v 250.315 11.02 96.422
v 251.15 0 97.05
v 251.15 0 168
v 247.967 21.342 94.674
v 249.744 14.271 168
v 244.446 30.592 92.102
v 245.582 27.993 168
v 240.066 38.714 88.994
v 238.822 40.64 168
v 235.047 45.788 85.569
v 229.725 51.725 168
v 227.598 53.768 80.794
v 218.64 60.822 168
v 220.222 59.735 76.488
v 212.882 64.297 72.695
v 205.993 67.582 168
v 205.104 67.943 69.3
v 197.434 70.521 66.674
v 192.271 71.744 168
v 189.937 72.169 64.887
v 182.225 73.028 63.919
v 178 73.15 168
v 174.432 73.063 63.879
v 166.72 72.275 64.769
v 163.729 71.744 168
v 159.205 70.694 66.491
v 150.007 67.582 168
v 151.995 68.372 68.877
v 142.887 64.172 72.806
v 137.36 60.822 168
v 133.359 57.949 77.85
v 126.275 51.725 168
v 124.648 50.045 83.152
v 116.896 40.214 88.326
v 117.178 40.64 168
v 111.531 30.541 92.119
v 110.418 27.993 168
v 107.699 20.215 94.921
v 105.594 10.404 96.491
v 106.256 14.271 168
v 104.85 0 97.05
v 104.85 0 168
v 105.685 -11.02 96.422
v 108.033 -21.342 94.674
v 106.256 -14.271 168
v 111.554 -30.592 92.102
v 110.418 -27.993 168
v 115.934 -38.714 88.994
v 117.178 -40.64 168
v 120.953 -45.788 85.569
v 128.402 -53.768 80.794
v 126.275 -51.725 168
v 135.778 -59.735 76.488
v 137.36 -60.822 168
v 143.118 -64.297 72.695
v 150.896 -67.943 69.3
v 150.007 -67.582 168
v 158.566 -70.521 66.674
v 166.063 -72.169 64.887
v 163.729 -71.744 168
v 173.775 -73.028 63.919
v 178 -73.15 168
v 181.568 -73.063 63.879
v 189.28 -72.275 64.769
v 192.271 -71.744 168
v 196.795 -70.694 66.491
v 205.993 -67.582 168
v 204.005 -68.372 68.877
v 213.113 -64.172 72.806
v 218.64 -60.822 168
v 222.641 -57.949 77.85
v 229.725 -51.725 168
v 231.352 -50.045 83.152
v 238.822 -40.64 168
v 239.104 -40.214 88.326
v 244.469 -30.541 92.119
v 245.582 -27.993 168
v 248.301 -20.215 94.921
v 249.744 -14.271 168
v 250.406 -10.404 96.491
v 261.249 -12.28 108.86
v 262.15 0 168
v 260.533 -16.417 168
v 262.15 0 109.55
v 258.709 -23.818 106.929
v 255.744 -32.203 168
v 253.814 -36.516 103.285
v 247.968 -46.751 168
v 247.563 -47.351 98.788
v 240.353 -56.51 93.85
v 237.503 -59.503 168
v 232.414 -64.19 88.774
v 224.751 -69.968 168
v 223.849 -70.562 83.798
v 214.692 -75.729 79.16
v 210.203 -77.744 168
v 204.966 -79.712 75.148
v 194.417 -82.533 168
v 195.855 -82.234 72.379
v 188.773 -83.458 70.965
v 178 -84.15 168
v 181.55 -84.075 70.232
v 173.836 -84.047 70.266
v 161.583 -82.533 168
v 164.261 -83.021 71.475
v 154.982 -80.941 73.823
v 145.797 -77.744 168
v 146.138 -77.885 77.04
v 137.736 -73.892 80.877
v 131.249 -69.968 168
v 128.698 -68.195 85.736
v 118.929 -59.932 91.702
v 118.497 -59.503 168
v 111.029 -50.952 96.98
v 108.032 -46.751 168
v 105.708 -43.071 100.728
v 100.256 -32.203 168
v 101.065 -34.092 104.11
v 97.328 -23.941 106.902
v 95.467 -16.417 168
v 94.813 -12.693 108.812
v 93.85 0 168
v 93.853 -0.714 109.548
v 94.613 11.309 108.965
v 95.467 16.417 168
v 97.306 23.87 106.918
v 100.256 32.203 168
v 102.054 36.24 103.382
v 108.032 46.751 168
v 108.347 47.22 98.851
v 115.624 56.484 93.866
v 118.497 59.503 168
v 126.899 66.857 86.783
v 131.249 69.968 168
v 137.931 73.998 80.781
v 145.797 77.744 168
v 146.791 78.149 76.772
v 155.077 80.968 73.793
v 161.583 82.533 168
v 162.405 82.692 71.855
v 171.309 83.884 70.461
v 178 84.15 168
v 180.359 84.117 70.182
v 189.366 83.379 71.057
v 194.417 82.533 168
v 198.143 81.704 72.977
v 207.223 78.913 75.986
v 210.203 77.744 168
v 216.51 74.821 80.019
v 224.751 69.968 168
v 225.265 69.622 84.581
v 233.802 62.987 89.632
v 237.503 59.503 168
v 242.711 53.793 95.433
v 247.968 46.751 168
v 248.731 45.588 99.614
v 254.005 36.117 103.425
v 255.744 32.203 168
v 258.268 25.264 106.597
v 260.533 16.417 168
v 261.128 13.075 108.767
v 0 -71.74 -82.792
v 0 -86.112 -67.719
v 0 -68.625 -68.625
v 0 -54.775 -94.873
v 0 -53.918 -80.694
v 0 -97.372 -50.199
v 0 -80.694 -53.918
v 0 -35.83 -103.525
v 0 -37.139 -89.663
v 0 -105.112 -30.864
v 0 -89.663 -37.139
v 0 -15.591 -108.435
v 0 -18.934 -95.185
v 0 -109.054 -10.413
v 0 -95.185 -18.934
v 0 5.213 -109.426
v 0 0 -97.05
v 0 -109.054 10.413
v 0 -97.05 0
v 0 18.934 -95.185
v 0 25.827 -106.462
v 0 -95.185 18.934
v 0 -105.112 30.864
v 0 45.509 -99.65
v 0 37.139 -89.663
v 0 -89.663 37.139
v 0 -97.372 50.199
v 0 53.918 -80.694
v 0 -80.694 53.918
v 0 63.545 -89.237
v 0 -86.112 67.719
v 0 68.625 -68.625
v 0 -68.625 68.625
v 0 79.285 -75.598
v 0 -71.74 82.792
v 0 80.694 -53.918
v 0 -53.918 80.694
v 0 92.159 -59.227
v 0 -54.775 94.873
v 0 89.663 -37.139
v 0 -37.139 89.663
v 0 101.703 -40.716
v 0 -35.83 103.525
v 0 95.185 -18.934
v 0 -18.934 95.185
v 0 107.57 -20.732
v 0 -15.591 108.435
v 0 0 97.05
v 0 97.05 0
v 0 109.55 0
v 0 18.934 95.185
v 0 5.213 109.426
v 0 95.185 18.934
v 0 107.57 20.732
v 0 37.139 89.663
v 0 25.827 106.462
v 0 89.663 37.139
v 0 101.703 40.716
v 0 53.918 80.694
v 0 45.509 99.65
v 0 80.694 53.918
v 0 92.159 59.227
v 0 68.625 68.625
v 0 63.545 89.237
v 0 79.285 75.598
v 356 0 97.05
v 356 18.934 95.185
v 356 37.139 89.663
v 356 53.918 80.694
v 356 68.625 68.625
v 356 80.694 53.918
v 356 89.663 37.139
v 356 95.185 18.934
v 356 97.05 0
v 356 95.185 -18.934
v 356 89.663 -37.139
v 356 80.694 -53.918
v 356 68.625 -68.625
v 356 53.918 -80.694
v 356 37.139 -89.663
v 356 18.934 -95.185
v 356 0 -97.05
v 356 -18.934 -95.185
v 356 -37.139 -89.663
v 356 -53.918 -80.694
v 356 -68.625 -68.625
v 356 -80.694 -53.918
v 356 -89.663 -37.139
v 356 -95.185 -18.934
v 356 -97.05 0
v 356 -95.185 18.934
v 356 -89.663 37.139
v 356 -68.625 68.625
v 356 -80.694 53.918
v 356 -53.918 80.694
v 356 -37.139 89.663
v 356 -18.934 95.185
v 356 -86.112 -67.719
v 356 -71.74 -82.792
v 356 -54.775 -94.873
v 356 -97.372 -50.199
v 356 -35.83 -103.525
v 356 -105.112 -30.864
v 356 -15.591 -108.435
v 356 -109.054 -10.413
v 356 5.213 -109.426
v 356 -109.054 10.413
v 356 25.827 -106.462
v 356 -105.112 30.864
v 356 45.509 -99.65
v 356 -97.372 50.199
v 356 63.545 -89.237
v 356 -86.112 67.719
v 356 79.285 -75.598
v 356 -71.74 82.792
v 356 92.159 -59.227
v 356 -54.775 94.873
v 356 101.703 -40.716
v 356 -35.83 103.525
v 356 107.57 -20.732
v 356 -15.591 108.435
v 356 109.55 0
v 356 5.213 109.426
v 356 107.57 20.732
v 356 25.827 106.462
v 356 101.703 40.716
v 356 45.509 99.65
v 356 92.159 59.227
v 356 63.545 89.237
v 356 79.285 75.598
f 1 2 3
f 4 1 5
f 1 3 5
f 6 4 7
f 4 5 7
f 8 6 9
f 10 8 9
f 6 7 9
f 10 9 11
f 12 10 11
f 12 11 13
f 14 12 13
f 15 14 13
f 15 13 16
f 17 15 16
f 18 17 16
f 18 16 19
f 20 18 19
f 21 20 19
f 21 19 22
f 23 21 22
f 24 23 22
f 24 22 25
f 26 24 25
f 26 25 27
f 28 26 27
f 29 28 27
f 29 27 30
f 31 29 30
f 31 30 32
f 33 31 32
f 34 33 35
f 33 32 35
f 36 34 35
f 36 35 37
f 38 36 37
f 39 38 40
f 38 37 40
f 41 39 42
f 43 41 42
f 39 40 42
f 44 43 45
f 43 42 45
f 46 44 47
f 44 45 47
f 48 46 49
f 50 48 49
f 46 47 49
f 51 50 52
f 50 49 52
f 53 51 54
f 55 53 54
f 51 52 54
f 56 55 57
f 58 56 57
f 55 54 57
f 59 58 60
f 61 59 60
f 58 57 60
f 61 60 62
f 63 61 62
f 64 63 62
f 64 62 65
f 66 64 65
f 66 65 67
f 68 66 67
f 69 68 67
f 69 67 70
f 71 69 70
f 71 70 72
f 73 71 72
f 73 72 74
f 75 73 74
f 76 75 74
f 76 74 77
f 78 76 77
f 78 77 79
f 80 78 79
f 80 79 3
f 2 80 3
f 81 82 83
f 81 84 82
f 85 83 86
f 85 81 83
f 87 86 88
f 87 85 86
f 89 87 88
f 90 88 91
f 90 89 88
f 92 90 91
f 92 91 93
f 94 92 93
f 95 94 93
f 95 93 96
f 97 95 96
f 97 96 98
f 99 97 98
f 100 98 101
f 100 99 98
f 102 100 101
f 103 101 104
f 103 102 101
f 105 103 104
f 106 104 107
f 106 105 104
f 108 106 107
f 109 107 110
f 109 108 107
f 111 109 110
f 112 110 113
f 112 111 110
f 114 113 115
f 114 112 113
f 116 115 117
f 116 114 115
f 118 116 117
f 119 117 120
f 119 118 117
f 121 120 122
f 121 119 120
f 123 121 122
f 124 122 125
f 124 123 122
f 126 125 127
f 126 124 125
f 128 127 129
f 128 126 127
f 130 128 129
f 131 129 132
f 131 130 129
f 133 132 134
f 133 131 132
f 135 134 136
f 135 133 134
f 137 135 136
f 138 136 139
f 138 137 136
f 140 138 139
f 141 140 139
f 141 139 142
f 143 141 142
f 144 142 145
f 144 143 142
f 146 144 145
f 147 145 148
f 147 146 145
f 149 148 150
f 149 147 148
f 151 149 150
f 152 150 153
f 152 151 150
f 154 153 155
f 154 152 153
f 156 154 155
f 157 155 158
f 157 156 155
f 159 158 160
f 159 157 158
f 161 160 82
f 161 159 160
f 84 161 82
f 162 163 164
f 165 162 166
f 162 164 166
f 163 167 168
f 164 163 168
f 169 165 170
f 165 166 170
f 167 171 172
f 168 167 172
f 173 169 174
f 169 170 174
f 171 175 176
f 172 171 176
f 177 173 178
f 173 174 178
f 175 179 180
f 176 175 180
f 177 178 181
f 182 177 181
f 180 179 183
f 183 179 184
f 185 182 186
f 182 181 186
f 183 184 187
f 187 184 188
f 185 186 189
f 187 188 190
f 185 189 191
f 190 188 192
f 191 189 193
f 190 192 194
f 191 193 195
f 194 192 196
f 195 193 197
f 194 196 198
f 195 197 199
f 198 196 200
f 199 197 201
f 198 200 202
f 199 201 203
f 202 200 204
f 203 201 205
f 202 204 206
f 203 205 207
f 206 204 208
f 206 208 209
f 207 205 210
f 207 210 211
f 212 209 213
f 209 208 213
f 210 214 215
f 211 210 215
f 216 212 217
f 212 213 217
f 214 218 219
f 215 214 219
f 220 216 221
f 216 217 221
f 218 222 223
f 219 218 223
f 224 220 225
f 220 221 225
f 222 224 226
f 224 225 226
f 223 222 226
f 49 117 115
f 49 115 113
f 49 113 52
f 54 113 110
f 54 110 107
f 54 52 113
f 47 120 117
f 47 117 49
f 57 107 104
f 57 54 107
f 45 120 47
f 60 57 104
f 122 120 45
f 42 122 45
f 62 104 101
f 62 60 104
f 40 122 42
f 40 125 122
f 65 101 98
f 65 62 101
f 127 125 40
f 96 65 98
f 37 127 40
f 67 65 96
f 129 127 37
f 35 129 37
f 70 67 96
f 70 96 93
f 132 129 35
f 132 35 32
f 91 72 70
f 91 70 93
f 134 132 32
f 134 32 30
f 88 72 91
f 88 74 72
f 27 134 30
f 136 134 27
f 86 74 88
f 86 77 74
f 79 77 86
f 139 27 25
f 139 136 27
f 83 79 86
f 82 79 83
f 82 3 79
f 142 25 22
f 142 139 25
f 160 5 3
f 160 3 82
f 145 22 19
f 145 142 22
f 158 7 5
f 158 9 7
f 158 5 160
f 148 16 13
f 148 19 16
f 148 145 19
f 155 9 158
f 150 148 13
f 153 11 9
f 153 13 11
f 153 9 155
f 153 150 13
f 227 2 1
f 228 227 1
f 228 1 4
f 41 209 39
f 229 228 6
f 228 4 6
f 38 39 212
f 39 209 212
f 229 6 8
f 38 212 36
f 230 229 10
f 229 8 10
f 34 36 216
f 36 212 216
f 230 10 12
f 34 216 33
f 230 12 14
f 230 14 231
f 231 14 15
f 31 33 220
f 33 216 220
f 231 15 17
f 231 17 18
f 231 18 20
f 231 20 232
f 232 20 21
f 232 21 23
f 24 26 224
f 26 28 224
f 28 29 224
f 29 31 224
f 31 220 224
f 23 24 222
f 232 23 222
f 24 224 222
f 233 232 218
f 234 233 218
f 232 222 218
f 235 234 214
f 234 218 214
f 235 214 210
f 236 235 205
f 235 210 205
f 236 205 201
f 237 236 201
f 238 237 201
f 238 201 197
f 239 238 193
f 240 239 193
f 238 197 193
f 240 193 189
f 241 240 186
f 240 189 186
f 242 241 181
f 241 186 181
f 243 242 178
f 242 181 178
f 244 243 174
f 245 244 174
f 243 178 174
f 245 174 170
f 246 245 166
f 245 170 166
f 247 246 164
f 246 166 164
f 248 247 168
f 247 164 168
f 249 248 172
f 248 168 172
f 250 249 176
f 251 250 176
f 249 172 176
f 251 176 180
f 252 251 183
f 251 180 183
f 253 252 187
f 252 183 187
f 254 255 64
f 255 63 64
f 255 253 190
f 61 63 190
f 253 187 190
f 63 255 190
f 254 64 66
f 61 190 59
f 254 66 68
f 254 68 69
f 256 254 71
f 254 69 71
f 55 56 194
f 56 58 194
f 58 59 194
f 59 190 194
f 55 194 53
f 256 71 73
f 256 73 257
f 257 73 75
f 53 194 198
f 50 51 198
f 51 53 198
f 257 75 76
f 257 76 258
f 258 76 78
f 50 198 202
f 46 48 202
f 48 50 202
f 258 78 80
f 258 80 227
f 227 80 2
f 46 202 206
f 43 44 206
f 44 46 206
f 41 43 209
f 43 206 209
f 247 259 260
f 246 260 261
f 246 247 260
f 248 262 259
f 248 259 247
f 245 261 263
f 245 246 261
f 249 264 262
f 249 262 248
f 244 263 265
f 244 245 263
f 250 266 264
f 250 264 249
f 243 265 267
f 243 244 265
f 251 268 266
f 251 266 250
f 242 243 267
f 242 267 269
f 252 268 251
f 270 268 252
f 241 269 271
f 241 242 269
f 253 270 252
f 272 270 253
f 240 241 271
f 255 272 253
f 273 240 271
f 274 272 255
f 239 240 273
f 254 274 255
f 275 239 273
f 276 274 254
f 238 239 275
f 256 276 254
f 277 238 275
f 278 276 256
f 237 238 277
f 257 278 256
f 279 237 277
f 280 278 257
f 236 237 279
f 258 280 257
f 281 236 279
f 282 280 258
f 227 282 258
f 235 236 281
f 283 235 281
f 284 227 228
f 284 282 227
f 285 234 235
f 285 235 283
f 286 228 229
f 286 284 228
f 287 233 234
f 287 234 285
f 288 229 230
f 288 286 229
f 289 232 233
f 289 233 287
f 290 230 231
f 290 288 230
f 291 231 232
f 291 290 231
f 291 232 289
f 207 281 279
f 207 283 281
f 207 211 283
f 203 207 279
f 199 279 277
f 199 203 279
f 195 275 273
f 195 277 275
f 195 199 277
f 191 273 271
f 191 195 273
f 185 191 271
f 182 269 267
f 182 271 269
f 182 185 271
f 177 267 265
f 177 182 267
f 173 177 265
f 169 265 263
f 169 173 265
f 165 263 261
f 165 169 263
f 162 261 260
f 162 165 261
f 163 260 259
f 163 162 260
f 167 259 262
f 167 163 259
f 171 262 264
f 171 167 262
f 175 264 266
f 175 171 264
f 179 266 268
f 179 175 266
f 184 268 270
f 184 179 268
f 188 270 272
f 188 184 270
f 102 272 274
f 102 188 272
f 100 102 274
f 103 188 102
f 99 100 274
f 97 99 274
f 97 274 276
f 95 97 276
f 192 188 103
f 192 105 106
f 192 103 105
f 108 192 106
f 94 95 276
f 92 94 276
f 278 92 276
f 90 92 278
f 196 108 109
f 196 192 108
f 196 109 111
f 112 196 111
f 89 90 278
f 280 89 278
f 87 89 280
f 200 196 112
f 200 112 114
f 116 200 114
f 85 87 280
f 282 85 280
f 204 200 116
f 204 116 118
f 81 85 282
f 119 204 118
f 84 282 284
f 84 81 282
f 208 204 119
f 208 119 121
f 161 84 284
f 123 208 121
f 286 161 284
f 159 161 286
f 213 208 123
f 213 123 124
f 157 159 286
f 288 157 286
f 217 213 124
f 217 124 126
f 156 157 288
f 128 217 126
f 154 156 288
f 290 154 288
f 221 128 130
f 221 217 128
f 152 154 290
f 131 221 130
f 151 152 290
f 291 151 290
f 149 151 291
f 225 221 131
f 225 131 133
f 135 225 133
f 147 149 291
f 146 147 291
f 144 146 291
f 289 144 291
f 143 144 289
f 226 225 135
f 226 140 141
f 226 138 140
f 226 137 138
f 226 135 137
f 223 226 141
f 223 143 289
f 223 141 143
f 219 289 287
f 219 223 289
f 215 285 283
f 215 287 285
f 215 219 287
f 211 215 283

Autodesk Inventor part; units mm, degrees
ref_plane "YZ Plane" through (0, 0, 0) normal (1, 0, 0) x (0, 1, 0)
ref_plane "XZ Plane" through (0, 0, 0) normal (0, 1, 0) x (-1, 0, 0)
ref_plane "XY Plane" through (0, 0, 0) normal (0, 0, 1) x (1, 0, 0)
sketch "Sketch1" plane through (0, 0, 0) normal (1, 0, 0) x (0, 1, 0)
  circle A0 centre (0, 0) radius 109.55
  dimension "d0" = 219.1
extrude "Extrude1" add sketch "Sketch1" along normal blind 356
sketch "Sketch2" plane through (0, 0, 0) normal (0, 0, 1) x (1, 0, 0)
  line L0 (0, 109.55) -> (0, -109.55) projected
  line L1 (356, 109.55) -> (356, -109.55) projected
  line L2 (0, 0) -> (356, 0) construction
  circle A0 centre (178, 0) radius 84.15
  dimension "d3" = 168.3
extrude "Extrude2" add sketch "Sketch2" along normal blind 168
sketch "Sketch3" plane through (0, 0, 0) normal (-1, 0, 0) x (0, 0, 1)
  circle A0 centre (0, 0) radius 109.55 projected
  circle A1 centre (0, 0) radius 97.05
  dimension "a" = 178
  dimension "d6" = 194.1
extrude "Extrude3" cut sketch "Sketch3" against normal through all contours A1
sketch "Sketch4" plane through (178, 0, 168) normal (0, 0, 1) x (1, 0, 0)
  circle A0 centre (0, 0) radius 84.15 projected
  circle A1 centre (0, 0) radius 73.15
  dimension "d9" = 146.3
extrude "Extrude4" cut sketch "Sketch4" against normal up to next contours A1
equation "\"d0\" = D1"
equation "\"d1\" = 2 * a"
equation "\"d3\" = D2"
equation "\"d4\" = b"
equation "\"a\" = 178"
equation "\"d6\" = D1 - 2 * s1"
equation "\"d7\" = a"
equation "\"d9\" = D2 - 2 * s2"
equation "\"d10\" = a"
equation "\"D1\" = 219.1"
equation "\"s1\" = 12.5"
equation "\"D2\" = 168.3"
equation "\"s2\" = 11"
equation "\"b\" = 168"
equation "\"Size_Designation\" = 1.2345"
properties part number "DIN 2615-1 Reducing Tee 219.1 x 12.5 - 168.3 x 11 S" material "Steel"
